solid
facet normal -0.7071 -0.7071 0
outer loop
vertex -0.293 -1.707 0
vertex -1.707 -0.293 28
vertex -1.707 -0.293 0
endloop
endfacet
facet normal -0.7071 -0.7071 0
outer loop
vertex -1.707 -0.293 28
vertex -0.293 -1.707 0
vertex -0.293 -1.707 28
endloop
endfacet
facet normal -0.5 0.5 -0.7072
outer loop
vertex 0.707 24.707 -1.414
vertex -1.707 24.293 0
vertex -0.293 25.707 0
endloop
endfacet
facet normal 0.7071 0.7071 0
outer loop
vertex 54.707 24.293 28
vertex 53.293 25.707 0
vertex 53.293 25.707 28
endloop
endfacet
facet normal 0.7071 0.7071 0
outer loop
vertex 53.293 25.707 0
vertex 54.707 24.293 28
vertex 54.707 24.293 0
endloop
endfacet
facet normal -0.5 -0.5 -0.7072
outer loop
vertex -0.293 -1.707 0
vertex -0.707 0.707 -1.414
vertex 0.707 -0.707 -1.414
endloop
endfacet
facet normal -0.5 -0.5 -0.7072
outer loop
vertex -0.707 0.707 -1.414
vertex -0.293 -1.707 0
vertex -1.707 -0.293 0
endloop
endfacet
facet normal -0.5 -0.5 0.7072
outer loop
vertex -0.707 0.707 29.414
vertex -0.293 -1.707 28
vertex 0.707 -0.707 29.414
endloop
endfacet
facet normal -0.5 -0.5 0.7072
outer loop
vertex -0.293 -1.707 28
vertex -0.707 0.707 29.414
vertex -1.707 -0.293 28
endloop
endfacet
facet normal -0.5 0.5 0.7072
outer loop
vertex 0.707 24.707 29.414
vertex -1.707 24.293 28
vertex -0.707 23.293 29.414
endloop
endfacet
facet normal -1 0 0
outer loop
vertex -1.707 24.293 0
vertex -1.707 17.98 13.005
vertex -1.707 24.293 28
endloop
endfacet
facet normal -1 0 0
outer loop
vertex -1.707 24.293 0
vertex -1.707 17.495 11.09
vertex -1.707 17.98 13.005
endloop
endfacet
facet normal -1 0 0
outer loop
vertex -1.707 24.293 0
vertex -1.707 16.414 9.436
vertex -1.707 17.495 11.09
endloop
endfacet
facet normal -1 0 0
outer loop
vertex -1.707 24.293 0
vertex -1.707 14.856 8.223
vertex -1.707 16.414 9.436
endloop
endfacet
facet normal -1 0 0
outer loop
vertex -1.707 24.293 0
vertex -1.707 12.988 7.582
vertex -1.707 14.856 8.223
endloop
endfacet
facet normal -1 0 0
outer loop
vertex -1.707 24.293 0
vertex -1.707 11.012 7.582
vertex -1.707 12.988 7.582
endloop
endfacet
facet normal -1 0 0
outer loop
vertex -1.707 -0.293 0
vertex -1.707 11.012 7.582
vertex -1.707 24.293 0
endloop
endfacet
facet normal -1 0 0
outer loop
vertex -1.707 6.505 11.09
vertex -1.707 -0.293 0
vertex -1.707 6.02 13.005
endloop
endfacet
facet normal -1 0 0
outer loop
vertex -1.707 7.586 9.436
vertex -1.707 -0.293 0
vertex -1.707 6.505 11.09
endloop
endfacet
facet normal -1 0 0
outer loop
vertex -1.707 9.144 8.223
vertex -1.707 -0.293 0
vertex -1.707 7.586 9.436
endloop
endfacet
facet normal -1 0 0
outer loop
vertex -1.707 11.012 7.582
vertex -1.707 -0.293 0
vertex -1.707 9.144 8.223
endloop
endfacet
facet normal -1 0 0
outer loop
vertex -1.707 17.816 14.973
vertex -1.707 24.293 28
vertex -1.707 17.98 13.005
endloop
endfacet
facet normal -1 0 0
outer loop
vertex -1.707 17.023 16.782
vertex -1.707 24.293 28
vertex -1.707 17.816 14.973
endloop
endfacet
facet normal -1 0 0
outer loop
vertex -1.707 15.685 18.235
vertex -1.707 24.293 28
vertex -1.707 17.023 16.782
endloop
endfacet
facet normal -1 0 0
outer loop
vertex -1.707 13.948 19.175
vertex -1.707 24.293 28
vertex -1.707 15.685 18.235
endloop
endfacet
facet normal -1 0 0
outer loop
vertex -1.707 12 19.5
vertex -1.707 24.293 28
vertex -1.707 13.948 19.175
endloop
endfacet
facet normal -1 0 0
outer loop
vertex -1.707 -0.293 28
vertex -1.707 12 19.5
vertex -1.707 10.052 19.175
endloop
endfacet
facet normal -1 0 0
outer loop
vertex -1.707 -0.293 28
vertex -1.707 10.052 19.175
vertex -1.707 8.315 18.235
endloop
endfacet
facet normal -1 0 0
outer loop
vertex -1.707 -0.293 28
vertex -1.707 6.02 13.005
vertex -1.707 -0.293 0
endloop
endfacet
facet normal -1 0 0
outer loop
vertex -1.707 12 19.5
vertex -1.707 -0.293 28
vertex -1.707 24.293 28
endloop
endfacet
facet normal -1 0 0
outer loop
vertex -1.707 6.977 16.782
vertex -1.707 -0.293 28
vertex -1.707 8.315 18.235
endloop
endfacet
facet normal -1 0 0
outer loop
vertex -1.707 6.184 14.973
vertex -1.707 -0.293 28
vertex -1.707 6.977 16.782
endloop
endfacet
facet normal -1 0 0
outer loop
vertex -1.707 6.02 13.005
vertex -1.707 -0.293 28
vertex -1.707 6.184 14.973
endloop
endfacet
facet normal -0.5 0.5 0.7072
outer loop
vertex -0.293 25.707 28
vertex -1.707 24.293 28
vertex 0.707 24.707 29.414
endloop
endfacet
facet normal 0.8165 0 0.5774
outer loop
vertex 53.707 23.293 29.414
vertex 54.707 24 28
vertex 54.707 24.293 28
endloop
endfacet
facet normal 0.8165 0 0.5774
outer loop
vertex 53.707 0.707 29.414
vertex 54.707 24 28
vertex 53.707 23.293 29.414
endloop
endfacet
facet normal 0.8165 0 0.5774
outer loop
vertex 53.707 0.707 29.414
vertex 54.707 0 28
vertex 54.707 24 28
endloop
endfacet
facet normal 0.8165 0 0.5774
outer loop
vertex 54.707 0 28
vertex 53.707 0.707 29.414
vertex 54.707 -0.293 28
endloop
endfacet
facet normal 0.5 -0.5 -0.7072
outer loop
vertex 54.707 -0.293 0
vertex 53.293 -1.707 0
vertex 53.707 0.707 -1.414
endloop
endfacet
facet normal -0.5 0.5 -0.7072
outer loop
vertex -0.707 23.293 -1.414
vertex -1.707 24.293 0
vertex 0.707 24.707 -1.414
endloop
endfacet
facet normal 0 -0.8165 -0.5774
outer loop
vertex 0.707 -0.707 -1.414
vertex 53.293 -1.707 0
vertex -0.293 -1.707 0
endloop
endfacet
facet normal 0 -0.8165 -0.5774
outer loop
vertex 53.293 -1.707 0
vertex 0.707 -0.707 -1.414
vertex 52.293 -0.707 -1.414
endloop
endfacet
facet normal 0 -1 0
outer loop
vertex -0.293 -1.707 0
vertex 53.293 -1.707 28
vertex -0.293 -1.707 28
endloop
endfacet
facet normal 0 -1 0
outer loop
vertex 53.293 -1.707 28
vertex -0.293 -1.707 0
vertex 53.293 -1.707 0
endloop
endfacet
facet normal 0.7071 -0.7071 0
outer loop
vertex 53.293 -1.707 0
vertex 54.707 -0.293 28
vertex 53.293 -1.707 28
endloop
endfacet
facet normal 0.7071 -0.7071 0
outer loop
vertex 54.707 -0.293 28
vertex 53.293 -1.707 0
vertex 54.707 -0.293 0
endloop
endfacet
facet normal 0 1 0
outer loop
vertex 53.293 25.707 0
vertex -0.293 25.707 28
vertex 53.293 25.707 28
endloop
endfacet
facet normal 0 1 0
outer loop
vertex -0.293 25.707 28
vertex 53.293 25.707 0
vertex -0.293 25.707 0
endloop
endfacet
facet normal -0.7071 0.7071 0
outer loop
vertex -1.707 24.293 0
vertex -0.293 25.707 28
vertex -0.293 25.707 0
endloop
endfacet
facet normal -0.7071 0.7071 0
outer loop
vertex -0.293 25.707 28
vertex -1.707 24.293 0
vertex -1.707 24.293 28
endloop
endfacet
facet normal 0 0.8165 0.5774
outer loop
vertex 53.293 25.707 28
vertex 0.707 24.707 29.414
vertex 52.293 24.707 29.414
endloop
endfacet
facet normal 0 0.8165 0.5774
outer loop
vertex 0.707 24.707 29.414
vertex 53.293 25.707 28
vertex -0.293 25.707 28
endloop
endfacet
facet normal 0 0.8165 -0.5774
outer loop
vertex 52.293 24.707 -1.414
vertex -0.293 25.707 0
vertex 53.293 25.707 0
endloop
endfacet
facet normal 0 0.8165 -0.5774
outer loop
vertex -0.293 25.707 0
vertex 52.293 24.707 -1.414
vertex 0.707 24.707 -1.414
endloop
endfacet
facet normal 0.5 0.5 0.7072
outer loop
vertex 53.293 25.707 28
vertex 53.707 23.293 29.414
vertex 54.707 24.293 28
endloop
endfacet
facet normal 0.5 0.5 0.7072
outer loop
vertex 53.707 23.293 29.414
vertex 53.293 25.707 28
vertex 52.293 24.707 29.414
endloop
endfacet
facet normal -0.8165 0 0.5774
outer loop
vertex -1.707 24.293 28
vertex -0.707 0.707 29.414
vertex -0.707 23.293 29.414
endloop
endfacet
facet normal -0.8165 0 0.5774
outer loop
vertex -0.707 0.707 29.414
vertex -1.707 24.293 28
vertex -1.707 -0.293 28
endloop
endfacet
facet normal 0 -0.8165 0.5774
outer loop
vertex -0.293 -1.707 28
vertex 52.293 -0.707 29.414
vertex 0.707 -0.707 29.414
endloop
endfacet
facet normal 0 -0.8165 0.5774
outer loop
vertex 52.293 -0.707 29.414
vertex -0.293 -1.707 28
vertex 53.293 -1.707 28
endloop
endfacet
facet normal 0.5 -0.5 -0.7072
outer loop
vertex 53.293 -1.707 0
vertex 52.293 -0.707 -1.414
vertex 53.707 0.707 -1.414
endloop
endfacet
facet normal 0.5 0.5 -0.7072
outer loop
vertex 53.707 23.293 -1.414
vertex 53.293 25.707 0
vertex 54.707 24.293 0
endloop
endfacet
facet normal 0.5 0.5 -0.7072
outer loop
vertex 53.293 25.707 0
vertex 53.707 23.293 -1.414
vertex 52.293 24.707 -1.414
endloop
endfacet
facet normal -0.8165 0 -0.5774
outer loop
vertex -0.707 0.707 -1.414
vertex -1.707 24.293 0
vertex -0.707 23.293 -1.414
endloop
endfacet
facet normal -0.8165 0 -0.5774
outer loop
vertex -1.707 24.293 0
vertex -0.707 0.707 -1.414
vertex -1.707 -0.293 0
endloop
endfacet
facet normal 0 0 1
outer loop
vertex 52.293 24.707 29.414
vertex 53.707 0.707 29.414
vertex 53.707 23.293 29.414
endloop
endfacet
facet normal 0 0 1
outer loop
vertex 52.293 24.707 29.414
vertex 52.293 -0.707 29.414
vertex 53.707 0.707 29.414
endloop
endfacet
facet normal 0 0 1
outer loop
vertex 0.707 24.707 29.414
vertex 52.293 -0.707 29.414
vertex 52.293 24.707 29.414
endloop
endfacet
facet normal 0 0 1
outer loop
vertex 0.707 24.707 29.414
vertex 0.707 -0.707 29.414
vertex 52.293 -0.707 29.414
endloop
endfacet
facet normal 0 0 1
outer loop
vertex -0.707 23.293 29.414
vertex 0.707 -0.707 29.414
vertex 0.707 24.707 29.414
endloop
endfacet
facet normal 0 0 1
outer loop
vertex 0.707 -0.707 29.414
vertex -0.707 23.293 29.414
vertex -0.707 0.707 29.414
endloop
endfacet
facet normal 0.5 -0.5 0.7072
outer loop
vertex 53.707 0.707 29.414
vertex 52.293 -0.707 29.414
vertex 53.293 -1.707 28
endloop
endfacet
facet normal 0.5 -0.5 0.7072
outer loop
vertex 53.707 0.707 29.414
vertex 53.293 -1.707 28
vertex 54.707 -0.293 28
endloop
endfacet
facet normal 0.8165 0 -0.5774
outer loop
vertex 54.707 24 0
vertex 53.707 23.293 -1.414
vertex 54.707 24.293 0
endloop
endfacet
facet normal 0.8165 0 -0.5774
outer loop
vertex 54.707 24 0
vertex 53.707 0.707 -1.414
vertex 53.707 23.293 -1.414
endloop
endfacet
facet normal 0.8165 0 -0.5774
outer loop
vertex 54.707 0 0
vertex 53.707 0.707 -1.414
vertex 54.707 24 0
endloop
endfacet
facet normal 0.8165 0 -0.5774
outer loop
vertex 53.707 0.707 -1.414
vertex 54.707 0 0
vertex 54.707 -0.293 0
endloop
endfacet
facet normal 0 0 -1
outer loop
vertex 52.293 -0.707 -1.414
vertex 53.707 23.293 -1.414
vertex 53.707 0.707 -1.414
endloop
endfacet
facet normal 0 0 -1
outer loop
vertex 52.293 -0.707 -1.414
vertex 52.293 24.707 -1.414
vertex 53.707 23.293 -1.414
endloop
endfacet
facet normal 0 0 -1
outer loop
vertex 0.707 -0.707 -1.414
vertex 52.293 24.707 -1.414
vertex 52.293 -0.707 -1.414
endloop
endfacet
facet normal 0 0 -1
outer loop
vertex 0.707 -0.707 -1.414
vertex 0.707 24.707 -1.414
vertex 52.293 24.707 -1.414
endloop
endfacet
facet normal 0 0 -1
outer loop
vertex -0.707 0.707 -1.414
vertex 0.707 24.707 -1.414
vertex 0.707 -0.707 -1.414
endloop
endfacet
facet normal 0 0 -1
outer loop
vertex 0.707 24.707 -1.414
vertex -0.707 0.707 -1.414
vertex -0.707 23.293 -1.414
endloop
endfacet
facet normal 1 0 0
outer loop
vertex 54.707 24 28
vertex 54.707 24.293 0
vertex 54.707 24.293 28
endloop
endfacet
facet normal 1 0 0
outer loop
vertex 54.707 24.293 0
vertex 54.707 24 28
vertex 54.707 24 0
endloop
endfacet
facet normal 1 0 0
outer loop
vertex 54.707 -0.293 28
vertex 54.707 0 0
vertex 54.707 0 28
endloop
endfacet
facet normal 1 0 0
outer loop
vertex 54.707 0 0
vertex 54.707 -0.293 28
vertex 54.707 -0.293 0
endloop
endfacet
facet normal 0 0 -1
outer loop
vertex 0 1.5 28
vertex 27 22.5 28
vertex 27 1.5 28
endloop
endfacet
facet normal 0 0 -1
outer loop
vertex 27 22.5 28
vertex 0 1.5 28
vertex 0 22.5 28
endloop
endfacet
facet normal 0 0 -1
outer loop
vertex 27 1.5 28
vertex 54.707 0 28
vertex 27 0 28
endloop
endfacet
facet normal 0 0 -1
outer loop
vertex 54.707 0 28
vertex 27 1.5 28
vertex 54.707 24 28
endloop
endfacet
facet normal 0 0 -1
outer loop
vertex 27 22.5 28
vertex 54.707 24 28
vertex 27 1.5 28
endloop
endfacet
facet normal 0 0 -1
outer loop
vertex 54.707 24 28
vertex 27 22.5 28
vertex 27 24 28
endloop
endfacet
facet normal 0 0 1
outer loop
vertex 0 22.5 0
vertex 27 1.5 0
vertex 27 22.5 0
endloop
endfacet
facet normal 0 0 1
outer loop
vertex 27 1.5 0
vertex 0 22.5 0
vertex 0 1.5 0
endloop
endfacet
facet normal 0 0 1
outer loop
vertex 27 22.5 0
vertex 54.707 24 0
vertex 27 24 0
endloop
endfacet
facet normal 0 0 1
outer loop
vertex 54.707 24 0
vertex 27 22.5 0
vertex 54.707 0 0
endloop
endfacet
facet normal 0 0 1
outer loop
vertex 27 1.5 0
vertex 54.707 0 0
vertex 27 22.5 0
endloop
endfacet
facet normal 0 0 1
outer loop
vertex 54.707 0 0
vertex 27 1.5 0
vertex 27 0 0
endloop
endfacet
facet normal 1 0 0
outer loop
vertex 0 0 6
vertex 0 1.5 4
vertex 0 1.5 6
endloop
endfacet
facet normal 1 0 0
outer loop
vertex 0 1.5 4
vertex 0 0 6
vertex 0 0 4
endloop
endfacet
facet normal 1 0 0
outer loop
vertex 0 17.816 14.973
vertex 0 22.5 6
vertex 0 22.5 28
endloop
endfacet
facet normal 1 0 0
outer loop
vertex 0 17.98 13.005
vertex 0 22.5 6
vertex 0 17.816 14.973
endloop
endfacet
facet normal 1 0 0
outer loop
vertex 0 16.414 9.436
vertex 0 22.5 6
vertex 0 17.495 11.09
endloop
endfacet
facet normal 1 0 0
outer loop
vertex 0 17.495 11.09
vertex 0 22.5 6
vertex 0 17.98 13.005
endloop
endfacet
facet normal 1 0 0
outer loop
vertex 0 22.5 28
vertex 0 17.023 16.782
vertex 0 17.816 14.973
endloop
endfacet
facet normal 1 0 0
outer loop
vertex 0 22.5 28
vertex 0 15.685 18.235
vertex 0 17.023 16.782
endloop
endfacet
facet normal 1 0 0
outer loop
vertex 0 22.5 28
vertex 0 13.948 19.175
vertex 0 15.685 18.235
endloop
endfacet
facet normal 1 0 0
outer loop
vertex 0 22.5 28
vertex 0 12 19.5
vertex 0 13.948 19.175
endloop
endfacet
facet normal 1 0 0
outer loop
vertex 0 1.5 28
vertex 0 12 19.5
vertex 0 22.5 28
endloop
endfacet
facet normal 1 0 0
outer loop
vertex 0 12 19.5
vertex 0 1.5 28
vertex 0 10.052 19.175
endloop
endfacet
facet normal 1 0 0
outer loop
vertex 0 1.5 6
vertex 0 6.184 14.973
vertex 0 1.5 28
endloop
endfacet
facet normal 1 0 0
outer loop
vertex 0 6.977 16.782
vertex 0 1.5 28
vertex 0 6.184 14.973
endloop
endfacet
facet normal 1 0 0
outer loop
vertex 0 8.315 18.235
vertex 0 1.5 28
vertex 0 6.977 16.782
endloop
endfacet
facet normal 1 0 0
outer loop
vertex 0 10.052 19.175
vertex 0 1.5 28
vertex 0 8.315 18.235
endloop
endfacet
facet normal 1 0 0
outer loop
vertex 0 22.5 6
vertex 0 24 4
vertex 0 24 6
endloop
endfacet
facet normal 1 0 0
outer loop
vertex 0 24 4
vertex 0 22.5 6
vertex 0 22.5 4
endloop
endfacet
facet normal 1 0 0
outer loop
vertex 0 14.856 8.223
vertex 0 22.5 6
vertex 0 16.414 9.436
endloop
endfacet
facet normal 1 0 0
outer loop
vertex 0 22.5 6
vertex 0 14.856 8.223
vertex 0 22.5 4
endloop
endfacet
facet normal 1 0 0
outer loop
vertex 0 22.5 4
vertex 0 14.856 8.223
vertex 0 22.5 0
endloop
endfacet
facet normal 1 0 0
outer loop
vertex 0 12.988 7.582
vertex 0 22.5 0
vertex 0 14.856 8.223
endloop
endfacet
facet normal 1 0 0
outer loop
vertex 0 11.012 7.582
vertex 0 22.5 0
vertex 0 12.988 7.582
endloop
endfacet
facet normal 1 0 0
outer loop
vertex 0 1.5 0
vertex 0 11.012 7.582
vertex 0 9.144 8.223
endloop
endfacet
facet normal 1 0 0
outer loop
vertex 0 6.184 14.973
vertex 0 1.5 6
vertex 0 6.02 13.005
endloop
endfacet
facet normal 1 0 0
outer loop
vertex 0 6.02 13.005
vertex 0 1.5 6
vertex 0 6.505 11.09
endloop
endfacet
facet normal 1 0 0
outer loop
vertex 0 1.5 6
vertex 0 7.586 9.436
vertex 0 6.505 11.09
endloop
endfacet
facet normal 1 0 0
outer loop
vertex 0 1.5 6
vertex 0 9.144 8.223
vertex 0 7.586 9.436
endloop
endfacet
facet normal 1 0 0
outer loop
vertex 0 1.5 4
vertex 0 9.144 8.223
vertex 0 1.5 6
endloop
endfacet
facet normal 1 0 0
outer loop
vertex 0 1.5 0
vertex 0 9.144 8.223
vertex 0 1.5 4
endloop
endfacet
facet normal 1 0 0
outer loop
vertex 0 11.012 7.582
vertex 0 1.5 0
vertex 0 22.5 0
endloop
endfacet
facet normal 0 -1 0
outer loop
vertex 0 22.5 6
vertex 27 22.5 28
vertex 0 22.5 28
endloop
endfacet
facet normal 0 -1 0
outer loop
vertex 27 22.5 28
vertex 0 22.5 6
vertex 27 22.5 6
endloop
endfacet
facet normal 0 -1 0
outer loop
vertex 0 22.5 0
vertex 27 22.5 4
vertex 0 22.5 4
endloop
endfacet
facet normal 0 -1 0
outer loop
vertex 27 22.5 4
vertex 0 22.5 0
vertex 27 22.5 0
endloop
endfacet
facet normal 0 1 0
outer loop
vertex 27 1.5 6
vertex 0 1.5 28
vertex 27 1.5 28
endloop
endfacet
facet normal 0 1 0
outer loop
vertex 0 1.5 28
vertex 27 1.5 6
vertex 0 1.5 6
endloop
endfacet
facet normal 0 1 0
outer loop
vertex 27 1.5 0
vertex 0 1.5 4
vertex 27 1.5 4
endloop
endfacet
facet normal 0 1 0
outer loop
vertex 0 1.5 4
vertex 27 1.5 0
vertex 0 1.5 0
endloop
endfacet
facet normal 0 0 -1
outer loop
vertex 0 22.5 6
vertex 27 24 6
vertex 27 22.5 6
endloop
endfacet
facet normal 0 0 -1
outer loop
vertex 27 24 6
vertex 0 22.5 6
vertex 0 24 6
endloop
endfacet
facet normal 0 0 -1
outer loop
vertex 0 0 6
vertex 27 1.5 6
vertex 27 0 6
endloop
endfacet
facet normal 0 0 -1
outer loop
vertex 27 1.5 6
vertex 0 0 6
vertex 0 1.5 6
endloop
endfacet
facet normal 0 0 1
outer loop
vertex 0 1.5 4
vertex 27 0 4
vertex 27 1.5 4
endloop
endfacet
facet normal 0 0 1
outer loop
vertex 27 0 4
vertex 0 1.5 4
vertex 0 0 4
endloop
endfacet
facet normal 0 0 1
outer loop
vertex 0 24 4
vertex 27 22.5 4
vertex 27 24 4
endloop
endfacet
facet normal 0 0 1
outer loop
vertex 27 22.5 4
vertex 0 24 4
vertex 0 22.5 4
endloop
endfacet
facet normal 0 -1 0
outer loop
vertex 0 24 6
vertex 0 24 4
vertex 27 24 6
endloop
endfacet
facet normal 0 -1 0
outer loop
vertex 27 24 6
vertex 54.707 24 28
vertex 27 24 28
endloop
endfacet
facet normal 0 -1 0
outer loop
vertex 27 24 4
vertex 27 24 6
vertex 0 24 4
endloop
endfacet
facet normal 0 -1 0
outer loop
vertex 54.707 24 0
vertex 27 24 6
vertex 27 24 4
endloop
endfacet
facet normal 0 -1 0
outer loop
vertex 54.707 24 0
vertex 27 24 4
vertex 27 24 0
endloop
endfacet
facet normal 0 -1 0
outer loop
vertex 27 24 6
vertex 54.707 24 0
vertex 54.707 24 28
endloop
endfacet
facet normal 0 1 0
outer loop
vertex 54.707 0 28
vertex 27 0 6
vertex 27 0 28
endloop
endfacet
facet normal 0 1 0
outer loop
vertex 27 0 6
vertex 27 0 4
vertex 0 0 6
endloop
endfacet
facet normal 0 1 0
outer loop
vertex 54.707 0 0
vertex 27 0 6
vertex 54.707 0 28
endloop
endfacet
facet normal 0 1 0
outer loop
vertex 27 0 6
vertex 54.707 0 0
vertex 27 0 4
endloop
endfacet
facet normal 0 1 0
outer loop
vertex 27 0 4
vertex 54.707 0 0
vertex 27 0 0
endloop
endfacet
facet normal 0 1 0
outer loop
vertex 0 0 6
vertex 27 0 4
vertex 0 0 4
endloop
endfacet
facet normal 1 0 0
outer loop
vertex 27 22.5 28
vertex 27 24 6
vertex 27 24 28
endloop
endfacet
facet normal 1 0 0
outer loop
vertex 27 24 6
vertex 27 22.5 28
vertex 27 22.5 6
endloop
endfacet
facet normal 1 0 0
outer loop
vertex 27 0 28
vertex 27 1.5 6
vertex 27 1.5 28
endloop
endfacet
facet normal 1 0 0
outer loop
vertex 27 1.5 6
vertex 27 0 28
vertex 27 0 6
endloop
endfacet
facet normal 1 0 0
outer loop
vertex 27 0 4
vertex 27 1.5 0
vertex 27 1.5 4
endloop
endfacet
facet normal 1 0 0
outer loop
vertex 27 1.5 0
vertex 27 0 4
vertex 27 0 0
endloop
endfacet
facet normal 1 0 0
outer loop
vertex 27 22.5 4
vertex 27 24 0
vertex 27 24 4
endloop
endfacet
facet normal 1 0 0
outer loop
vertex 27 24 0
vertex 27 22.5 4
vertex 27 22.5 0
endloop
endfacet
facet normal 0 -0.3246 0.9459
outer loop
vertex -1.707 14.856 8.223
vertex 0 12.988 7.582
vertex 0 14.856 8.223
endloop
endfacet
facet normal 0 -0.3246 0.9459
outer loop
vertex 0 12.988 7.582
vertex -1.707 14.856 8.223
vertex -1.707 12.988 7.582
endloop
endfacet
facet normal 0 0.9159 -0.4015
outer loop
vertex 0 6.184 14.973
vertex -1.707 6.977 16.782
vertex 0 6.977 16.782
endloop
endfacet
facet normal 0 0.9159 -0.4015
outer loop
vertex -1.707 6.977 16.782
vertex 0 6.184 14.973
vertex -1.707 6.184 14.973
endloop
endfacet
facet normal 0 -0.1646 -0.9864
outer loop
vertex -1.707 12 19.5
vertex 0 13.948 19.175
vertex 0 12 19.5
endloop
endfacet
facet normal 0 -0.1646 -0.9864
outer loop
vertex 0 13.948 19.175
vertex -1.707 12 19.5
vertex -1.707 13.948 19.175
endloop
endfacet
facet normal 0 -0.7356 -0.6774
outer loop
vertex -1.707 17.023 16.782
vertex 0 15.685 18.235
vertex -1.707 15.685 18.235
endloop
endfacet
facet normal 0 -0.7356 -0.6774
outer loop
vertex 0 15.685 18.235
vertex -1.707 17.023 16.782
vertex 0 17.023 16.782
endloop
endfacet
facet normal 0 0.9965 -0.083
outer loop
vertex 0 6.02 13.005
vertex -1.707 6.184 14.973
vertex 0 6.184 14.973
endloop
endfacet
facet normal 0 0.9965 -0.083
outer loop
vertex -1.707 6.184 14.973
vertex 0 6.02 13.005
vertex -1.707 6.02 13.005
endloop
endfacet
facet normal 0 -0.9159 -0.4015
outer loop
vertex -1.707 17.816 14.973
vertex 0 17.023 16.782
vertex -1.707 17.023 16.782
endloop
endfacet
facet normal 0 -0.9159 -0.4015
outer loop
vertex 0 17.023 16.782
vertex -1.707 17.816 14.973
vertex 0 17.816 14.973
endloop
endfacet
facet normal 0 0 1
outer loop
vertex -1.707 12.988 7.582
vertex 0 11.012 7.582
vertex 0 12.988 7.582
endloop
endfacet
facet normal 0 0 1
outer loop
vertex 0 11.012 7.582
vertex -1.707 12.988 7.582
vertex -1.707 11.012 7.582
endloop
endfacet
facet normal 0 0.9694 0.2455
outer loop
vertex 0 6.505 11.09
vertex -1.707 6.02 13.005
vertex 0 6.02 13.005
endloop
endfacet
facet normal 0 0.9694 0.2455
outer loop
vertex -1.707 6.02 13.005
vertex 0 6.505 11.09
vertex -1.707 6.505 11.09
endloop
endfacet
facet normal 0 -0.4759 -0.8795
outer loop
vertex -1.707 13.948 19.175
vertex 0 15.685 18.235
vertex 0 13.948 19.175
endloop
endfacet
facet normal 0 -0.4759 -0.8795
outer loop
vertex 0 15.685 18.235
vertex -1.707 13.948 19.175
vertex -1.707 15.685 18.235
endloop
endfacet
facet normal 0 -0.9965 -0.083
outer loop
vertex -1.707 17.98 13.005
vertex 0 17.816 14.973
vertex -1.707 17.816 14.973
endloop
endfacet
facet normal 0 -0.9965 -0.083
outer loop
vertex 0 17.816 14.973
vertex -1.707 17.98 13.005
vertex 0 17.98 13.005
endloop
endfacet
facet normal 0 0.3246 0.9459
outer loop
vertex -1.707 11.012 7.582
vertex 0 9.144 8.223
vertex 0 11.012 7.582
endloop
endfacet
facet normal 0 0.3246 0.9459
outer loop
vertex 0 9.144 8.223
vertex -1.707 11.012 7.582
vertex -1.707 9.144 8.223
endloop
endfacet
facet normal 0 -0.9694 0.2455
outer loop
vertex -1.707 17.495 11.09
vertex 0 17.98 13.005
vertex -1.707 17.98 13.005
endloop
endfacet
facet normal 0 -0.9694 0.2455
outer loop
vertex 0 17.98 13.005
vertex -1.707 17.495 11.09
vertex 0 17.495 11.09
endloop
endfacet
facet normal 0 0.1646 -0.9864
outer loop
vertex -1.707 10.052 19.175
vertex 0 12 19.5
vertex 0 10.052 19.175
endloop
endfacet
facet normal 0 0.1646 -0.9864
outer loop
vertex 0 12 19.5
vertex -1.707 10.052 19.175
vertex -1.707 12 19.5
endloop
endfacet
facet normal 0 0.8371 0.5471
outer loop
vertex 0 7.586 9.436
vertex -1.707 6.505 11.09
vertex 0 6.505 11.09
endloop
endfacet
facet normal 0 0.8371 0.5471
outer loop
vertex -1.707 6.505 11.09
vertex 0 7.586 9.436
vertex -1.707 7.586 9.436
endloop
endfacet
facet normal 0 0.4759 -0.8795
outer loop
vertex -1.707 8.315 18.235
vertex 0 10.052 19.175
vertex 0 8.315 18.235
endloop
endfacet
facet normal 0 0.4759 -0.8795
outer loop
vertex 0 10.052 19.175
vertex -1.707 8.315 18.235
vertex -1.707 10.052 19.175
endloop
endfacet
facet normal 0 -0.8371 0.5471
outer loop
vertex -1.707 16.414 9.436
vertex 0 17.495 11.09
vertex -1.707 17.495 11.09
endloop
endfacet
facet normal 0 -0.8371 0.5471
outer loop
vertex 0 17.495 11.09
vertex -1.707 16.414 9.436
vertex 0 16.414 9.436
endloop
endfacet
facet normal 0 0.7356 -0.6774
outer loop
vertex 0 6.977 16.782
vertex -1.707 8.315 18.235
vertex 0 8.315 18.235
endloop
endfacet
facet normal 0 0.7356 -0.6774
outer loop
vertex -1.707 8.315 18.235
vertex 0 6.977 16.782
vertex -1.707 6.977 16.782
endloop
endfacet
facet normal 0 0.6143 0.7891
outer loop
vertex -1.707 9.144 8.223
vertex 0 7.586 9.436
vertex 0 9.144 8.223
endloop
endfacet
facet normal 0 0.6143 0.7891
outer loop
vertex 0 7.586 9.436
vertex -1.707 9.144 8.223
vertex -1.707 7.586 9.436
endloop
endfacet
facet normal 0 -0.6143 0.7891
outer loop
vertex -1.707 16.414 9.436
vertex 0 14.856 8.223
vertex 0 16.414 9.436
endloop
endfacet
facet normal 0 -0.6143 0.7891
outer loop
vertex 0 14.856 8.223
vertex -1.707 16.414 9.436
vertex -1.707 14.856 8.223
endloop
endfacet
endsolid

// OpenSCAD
//translate([-15, 38.5, 4]) import("schematic/tinysynth.stl");

w = 53;
d = 24;
h = 28;
r = 2;
frontW = 28;
wedgeW = w + r;
wedgeD = 1.5;
wedgeH = 2;
pcbO = 4;

difference() {
	hull() {
		for (x = [0, w]) {
			for (y = [0, d]) {
				for (z = [0, h]) {
					translate([x, y, z]) rotate([0, 45, x > 0 != y > 0 ? -45 : 45]) cube(r, true);
				}
			}
		}
	}
	translate([0, wedgeD, 0]) cube([w + r, d - 2 * wedgeD, h]);
	translate([0, 0, pcbO]) cube([wedgeW, d, wedgeH]);
    translate([w - frontW + r, 0, 0]) cube([frontW, d, h]);
	translate([0, d/2, 7.5 + pcbO + wedgeH]) rotate([0, -90, 0]) cylinder(d = 12, h = r);
}
